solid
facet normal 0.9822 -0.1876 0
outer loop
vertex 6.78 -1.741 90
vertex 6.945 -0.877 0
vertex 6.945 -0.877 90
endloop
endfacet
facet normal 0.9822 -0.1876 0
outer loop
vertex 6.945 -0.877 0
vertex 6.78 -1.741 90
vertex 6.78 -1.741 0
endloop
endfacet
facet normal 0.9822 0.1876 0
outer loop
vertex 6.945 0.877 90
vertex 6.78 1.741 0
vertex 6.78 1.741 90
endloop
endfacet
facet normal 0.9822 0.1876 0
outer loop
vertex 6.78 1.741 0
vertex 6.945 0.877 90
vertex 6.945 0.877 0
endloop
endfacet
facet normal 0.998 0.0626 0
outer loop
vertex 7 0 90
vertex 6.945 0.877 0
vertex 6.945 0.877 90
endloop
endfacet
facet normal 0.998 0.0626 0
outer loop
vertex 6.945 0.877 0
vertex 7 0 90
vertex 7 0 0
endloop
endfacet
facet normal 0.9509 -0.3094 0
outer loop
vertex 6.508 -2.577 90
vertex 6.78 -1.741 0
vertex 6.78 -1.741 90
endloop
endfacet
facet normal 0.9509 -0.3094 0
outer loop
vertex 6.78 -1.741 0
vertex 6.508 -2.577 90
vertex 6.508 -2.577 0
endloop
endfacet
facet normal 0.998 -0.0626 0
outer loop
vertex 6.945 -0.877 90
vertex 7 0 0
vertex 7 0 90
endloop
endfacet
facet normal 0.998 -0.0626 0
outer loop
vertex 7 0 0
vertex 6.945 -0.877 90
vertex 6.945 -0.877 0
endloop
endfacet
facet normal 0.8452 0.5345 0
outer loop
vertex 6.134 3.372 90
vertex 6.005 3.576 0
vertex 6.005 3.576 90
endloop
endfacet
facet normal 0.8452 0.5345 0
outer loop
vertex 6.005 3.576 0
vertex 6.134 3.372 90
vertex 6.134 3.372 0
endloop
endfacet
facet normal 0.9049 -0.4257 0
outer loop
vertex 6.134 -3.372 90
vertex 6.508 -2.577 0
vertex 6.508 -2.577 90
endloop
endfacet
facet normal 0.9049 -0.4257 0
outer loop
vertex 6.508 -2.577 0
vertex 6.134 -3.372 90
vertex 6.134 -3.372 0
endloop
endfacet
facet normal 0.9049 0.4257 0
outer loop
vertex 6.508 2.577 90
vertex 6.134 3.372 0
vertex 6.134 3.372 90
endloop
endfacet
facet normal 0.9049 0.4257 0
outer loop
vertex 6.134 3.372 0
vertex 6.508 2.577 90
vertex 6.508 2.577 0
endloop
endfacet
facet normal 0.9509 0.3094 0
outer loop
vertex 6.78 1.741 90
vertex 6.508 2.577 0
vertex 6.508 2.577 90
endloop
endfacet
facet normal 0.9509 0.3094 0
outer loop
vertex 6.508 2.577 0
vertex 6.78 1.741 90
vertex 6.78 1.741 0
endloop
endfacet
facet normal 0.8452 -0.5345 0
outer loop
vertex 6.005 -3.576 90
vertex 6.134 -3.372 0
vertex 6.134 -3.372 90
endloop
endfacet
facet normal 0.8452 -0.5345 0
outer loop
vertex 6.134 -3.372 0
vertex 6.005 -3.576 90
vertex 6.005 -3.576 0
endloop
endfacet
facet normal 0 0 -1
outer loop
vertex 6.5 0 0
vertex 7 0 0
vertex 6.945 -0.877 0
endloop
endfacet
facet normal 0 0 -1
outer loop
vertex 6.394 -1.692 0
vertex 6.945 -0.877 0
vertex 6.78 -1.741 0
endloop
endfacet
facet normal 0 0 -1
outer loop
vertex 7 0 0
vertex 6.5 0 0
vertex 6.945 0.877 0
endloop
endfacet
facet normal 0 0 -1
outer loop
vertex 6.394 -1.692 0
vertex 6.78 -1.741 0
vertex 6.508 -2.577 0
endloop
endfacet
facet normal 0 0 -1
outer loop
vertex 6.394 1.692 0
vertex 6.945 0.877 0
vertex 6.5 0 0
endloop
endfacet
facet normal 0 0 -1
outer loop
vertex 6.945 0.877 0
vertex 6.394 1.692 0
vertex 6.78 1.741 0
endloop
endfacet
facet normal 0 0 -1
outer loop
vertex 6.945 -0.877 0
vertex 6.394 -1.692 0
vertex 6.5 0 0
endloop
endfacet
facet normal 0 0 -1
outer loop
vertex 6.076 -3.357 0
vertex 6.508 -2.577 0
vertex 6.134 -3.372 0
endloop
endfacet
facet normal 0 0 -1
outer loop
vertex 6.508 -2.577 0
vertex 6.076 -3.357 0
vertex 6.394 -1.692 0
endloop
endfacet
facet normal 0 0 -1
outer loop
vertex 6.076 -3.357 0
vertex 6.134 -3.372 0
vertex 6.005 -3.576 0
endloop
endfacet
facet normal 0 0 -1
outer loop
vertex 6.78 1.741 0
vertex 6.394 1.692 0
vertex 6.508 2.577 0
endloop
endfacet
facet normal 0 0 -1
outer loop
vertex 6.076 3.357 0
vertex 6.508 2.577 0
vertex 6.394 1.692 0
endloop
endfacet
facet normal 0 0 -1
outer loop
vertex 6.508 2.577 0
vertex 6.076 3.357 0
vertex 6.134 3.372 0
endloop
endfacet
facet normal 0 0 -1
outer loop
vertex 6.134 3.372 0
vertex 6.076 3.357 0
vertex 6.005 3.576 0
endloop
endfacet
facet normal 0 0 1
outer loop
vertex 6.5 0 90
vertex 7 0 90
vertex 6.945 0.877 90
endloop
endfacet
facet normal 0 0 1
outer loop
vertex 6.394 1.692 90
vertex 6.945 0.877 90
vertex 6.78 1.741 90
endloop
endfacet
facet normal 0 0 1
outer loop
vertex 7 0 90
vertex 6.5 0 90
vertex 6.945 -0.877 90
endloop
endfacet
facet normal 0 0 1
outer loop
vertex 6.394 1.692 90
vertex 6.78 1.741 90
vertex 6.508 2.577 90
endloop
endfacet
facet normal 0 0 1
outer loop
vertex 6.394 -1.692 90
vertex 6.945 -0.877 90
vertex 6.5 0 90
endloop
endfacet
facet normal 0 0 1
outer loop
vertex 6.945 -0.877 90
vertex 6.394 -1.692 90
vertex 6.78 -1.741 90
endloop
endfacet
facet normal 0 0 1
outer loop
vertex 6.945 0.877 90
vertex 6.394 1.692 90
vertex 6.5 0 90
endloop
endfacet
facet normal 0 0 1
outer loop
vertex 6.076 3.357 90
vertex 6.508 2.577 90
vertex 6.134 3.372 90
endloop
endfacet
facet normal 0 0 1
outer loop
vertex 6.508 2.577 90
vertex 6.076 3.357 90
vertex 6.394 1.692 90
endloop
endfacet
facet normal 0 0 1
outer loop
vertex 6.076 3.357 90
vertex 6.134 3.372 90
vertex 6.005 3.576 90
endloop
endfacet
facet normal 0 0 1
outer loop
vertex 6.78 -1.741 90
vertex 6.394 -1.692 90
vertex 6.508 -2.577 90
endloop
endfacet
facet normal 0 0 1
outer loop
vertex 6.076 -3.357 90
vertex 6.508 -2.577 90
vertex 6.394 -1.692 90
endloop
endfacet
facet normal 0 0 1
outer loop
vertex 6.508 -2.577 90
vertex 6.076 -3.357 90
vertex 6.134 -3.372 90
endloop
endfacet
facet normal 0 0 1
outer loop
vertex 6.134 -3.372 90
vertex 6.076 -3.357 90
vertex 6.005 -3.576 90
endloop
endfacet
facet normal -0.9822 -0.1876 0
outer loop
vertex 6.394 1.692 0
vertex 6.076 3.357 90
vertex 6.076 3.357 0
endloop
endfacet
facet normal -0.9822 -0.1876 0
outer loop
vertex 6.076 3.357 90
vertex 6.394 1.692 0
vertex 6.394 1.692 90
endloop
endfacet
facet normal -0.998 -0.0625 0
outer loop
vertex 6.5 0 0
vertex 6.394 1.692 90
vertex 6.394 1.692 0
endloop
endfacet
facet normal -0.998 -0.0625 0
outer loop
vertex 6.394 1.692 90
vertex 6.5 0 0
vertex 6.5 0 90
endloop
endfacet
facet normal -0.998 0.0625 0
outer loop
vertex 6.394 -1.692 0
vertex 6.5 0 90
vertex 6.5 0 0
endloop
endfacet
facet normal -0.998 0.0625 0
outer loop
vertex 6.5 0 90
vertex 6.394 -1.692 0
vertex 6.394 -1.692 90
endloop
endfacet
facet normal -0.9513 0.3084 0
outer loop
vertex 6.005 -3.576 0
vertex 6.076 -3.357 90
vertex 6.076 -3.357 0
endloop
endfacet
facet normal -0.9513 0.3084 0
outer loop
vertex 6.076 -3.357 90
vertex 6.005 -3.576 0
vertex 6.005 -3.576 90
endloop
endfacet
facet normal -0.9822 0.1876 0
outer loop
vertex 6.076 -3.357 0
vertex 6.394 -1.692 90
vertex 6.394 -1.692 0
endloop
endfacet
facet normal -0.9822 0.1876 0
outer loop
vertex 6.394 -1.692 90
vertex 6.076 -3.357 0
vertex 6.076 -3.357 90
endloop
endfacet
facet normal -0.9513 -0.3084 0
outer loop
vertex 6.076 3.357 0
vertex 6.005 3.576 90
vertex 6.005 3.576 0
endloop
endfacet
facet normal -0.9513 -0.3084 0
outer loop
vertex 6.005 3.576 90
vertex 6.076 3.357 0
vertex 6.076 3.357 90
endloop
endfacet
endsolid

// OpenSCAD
$fn = 50;


difference() {
	union() {
		cylinder(h = 90, r = 7.0000000000);
		translate(v = [-10.0000000000, 0, 0]) {
			cylinder(h = 90, r = 7.0000000000);
		}
	}
	union() {
		cylinder(h = 90, r = 3.2500000000);
		cylinder(h = 90, r = 1.8000000000);
		cylinder(h = 90, r = 1.8000000000);
		cylinder(h = 90, r = 1.8000000000);
		translate(v = [-14.5000000000, 0, 0]) {
			hull() {
				translate(v = [-3.7500000000, 0.0000000000, 0]) {
					cylinder(h = 90, r = 7.5000000000);
				}
				translate(v = [3.7500000000, 0.0000000000, 0]) {
					cylinder(h = 90, r = 7.5000000000);
				}
				translate(v = [-3.7500000000, -0.0000000000, 0]) {
					cylinder(h = 90, r = 7.5000000000);
				}
				translate(v = [3.7500000000, -0.0000000000, 0]) {
					cylinder(h = 90, r = 7.5000000000);
				}
			}
		}
		translate(v = [-7.0000000000, 0, 0.0000000000]) {
			cylinder(h = 90, r = 13.5000000000);
		}
	}
}
